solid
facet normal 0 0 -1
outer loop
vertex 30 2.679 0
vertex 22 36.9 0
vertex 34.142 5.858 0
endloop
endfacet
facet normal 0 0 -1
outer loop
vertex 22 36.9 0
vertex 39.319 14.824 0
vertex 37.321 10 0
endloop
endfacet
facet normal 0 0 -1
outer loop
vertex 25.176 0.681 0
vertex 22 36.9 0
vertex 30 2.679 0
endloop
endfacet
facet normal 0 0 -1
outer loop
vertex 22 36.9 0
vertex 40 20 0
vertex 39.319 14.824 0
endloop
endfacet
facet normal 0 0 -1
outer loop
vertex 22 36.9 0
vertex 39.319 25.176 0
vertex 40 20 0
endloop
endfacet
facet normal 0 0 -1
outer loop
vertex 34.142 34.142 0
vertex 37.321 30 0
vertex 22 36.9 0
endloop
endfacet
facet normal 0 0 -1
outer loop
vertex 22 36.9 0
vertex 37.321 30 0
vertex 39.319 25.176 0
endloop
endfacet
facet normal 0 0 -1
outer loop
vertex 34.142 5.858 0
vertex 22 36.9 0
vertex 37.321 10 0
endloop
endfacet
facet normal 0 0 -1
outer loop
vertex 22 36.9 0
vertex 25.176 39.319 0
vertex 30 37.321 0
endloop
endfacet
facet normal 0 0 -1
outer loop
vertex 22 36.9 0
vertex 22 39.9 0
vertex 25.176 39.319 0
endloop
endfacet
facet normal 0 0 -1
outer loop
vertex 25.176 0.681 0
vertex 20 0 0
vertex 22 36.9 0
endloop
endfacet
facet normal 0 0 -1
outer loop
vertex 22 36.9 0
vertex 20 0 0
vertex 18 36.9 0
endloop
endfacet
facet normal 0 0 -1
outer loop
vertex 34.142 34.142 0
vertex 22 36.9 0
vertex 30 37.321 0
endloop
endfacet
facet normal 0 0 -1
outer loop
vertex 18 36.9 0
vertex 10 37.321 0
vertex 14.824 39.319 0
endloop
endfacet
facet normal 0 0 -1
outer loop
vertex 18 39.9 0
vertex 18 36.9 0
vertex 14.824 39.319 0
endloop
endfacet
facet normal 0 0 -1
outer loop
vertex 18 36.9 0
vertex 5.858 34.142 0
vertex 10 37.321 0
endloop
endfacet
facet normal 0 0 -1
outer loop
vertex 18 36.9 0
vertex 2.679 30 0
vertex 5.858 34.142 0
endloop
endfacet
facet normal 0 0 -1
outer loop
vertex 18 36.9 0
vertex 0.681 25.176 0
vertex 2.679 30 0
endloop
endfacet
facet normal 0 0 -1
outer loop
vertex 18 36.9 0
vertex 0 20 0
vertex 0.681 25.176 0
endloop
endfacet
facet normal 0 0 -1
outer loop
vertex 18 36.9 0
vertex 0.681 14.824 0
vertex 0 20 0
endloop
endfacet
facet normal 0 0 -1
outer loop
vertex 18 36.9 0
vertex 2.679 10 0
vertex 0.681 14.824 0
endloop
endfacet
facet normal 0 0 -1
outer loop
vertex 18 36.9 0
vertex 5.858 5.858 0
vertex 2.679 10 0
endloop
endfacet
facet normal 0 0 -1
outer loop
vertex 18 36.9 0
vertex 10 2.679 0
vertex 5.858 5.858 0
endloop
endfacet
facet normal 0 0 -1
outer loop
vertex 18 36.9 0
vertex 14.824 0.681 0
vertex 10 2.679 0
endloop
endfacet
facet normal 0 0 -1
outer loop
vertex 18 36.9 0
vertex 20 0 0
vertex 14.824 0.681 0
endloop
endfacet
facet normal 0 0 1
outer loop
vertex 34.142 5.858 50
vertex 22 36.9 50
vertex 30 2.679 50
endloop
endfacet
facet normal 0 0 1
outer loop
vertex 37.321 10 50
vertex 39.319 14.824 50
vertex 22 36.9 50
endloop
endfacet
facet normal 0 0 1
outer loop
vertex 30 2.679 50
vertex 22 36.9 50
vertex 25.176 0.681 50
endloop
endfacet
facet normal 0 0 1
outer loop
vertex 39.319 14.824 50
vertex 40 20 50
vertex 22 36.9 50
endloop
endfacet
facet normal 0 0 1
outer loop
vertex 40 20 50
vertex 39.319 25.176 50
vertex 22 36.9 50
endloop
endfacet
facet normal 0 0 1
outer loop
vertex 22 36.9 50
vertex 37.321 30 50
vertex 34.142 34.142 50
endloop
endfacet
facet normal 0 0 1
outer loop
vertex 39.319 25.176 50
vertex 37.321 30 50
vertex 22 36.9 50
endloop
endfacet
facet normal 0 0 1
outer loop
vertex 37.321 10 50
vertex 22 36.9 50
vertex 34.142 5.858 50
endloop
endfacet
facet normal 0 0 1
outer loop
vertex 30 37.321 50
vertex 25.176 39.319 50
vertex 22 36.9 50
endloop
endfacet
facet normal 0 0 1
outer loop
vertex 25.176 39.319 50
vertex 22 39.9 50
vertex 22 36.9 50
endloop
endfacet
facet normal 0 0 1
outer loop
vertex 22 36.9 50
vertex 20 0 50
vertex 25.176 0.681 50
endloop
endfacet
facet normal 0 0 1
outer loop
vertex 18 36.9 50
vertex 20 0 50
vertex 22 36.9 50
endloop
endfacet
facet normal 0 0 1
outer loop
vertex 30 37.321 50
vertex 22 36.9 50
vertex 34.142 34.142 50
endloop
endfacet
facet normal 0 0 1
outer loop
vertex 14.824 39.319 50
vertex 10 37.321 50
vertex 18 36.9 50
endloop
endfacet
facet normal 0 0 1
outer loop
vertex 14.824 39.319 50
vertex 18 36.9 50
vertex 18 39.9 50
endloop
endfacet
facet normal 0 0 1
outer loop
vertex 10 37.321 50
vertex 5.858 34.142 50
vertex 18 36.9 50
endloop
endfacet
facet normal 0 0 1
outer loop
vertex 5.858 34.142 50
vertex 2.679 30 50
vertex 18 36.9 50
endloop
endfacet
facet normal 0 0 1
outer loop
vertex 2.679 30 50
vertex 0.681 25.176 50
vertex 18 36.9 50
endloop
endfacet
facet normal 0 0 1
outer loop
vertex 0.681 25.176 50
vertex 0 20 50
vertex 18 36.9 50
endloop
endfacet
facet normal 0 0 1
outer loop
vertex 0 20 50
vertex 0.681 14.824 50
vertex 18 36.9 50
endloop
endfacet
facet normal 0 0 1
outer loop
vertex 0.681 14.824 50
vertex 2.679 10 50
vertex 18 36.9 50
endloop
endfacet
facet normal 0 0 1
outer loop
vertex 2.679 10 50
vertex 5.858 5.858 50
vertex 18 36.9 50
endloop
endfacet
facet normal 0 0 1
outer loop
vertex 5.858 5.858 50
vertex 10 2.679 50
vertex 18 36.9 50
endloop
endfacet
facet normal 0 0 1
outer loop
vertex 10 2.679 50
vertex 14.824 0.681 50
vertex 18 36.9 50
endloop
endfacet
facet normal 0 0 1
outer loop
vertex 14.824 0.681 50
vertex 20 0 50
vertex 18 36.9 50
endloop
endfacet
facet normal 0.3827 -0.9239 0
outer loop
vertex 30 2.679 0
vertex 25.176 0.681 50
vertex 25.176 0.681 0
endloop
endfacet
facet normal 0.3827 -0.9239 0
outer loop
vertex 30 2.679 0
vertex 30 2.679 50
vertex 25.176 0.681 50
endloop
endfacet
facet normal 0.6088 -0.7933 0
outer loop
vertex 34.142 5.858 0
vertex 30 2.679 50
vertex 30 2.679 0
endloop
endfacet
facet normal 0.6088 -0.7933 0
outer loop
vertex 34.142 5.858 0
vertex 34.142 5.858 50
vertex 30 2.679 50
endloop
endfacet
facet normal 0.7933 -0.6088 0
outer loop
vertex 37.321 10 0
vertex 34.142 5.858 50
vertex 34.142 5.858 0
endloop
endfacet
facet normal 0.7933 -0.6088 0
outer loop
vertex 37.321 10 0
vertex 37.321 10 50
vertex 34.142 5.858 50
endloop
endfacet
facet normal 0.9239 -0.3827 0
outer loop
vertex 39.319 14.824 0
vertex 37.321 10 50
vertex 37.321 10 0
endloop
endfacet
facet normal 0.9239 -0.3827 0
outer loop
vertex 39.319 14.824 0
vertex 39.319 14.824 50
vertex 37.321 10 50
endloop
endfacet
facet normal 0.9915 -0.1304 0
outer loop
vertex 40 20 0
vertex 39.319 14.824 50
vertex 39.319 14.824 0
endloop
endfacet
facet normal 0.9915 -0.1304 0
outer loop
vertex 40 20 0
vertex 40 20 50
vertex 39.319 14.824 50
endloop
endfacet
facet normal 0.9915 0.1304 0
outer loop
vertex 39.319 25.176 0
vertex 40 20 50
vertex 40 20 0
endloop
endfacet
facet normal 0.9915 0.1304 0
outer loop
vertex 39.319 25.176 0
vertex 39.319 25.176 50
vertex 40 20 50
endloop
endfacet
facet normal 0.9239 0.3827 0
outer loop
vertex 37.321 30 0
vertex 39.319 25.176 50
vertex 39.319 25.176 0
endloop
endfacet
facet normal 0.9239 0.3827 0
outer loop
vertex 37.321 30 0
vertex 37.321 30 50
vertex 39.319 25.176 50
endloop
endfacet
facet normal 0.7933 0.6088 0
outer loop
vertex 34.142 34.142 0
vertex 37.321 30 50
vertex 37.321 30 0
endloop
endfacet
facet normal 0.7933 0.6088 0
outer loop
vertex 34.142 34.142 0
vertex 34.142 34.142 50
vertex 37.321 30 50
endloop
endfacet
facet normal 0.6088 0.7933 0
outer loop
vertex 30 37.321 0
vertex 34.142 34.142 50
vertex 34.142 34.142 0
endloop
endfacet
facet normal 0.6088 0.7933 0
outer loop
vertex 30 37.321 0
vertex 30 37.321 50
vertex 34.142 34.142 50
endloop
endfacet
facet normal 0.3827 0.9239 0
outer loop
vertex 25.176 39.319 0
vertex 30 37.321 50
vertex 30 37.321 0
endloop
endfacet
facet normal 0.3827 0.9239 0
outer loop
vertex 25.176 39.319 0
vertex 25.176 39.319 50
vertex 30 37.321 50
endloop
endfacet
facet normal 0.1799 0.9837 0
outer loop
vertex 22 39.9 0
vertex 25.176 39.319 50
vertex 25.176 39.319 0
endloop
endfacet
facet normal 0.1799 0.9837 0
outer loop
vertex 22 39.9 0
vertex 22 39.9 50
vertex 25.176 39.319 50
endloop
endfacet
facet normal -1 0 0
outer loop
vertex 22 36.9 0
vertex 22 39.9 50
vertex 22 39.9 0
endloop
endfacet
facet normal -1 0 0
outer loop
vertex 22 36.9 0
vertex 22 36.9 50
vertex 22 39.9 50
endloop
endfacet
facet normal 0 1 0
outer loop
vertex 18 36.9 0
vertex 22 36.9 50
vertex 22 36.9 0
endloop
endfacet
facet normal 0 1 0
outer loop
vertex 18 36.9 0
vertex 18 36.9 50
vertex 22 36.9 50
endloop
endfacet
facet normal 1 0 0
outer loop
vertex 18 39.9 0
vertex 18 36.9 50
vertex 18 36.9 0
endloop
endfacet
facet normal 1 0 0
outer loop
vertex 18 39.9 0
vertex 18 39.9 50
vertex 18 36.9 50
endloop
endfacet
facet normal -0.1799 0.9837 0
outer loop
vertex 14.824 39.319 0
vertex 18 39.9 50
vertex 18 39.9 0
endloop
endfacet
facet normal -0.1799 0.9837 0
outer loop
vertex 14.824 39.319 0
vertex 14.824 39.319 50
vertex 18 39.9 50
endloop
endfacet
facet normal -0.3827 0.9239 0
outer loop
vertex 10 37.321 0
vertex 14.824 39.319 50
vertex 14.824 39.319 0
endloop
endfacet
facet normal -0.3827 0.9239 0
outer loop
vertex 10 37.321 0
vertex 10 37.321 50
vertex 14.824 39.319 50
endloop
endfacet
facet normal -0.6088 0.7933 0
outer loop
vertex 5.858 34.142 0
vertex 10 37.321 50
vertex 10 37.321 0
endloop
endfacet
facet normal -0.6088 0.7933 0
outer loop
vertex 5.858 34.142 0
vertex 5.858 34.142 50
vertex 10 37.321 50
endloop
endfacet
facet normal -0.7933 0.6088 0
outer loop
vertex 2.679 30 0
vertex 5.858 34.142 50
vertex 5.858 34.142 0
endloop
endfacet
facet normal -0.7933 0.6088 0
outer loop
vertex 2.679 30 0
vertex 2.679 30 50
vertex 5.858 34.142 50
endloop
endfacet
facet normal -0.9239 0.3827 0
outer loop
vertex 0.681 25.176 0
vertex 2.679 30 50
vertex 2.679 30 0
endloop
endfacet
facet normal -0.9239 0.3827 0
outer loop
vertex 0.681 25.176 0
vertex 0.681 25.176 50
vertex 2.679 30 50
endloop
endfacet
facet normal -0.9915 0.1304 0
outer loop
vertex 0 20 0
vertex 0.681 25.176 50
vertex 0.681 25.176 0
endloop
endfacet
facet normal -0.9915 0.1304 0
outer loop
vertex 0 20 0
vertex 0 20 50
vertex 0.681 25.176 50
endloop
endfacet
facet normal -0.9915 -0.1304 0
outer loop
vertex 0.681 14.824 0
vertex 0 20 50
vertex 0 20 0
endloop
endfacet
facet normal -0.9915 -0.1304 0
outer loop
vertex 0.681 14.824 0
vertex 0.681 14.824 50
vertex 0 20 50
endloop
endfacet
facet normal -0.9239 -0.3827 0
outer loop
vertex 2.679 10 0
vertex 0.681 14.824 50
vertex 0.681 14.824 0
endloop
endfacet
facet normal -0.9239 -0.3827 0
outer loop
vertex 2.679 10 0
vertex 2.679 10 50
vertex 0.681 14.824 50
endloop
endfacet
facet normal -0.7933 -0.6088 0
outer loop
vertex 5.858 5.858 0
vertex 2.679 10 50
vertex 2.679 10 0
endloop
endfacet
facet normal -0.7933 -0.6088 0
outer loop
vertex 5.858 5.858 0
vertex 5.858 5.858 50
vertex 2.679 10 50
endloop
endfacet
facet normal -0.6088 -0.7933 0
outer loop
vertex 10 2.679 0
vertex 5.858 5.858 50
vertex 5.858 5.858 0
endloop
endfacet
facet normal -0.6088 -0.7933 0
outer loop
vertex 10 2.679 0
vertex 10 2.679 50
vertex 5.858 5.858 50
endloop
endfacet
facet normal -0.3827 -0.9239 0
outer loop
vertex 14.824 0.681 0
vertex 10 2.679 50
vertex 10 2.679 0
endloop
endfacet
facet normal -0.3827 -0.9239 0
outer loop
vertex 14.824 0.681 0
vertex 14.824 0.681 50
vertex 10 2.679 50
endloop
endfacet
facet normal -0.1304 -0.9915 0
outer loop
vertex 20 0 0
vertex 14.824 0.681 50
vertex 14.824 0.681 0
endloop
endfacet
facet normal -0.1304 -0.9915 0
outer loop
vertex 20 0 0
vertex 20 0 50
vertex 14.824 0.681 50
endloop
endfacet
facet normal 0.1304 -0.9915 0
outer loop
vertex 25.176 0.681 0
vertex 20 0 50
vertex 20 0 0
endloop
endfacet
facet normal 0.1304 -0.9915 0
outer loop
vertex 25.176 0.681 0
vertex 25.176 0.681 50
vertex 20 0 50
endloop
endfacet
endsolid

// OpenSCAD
$fn = 32;

// ----------------------------------------------------------------------
// Keyway shaft: d40 shaft, key 4 x 3 mm
// ----------------------------------------------------------------------

// --- parameters (mm) ---
shaft_r = 20;             // shaft radius
key_w = 4;                // keyway width
key_d = 3;                // keyway depth below the surface line
plate_t = 50;             // shaft length, Z (extrusion height)

shaft_d = 2 * shaft_r;  // shaft diameter
circle_step = 15;  // polygon sampling step, degrees

profile = [[14.824, 39.319], [10, 37.321], [5.858, 34.142], [2.679, 30], [0.681, 25.176], [0, 20], [0.681, 14.824], [2.679, 10], [5.858, 5.858], [10, 2.679], [14.824, 0.681], [20, 0], [25.176, 0.681], [30, 2.679], [34.142, 5.858], [37.321, 10], [39.319, 14.824], [40, 20], [39.319, 25.176], [37.321, 30], [34.142, 34.142], [30, 37.321], [25.176, 39.319], [22, 39.9], [22, 36.9], [18, 36.9], [18, 39.9]];  // primary outline, 27 points, counter clockwise

// --- the one profile operation ---
linear_extrude(height = plate_t) polygon(points = profile);
